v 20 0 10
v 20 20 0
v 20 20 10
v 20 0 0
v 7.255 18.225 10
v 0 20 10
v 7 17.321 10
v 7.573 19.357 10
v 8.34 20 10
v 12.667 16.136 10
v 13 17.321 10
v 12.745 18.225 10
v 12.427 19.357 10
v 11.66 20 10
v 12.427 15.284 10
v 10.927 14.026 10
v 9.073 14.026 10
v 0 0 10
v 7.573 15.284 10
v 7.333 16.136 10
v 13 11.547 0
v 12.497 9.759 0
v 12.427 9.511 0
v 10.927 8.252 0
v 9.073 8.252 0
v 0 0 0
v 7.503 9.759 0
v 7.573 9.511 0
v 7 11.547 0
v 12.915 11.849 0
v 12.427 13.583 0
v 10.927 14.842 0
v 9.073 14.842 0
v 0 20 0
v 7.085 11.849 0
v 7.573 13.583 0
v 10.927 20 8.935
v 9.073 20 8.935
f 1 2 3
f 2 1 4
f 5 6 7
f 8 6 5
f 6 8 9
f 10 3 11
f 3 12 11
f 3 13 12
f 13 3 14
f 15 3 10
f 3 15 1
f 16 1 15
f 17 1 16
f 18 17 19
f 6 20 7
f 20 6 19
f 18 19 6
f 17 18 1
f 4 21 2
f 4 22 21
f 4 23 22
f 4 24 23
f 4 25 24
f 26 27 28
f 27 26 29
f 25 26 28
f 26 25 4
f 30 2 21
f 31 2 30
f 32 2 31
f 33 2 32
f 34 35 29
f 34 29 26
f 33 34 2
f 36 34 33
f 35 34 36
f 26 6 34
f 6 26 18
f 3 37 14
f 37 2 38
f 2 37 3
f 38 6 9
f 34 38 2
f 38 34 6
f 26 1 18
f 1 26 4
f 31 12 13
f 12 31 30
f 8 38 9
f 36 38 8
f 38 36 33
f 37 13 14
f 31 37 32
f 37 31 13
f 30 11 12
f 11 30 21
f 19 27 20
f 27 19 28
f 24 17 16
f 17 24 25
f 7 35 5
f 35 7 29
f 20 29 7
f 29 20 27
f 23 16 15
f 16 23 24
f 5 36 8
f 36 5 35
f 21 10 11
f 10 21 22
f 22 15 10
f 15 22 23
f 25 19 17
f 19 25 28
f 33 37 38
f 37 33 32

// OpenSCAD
difference() {
    cube([20,20,10]);
    rotate(-30,[1,0,0])translate([10,10,0])cylinder(r=3,h=40);
}
